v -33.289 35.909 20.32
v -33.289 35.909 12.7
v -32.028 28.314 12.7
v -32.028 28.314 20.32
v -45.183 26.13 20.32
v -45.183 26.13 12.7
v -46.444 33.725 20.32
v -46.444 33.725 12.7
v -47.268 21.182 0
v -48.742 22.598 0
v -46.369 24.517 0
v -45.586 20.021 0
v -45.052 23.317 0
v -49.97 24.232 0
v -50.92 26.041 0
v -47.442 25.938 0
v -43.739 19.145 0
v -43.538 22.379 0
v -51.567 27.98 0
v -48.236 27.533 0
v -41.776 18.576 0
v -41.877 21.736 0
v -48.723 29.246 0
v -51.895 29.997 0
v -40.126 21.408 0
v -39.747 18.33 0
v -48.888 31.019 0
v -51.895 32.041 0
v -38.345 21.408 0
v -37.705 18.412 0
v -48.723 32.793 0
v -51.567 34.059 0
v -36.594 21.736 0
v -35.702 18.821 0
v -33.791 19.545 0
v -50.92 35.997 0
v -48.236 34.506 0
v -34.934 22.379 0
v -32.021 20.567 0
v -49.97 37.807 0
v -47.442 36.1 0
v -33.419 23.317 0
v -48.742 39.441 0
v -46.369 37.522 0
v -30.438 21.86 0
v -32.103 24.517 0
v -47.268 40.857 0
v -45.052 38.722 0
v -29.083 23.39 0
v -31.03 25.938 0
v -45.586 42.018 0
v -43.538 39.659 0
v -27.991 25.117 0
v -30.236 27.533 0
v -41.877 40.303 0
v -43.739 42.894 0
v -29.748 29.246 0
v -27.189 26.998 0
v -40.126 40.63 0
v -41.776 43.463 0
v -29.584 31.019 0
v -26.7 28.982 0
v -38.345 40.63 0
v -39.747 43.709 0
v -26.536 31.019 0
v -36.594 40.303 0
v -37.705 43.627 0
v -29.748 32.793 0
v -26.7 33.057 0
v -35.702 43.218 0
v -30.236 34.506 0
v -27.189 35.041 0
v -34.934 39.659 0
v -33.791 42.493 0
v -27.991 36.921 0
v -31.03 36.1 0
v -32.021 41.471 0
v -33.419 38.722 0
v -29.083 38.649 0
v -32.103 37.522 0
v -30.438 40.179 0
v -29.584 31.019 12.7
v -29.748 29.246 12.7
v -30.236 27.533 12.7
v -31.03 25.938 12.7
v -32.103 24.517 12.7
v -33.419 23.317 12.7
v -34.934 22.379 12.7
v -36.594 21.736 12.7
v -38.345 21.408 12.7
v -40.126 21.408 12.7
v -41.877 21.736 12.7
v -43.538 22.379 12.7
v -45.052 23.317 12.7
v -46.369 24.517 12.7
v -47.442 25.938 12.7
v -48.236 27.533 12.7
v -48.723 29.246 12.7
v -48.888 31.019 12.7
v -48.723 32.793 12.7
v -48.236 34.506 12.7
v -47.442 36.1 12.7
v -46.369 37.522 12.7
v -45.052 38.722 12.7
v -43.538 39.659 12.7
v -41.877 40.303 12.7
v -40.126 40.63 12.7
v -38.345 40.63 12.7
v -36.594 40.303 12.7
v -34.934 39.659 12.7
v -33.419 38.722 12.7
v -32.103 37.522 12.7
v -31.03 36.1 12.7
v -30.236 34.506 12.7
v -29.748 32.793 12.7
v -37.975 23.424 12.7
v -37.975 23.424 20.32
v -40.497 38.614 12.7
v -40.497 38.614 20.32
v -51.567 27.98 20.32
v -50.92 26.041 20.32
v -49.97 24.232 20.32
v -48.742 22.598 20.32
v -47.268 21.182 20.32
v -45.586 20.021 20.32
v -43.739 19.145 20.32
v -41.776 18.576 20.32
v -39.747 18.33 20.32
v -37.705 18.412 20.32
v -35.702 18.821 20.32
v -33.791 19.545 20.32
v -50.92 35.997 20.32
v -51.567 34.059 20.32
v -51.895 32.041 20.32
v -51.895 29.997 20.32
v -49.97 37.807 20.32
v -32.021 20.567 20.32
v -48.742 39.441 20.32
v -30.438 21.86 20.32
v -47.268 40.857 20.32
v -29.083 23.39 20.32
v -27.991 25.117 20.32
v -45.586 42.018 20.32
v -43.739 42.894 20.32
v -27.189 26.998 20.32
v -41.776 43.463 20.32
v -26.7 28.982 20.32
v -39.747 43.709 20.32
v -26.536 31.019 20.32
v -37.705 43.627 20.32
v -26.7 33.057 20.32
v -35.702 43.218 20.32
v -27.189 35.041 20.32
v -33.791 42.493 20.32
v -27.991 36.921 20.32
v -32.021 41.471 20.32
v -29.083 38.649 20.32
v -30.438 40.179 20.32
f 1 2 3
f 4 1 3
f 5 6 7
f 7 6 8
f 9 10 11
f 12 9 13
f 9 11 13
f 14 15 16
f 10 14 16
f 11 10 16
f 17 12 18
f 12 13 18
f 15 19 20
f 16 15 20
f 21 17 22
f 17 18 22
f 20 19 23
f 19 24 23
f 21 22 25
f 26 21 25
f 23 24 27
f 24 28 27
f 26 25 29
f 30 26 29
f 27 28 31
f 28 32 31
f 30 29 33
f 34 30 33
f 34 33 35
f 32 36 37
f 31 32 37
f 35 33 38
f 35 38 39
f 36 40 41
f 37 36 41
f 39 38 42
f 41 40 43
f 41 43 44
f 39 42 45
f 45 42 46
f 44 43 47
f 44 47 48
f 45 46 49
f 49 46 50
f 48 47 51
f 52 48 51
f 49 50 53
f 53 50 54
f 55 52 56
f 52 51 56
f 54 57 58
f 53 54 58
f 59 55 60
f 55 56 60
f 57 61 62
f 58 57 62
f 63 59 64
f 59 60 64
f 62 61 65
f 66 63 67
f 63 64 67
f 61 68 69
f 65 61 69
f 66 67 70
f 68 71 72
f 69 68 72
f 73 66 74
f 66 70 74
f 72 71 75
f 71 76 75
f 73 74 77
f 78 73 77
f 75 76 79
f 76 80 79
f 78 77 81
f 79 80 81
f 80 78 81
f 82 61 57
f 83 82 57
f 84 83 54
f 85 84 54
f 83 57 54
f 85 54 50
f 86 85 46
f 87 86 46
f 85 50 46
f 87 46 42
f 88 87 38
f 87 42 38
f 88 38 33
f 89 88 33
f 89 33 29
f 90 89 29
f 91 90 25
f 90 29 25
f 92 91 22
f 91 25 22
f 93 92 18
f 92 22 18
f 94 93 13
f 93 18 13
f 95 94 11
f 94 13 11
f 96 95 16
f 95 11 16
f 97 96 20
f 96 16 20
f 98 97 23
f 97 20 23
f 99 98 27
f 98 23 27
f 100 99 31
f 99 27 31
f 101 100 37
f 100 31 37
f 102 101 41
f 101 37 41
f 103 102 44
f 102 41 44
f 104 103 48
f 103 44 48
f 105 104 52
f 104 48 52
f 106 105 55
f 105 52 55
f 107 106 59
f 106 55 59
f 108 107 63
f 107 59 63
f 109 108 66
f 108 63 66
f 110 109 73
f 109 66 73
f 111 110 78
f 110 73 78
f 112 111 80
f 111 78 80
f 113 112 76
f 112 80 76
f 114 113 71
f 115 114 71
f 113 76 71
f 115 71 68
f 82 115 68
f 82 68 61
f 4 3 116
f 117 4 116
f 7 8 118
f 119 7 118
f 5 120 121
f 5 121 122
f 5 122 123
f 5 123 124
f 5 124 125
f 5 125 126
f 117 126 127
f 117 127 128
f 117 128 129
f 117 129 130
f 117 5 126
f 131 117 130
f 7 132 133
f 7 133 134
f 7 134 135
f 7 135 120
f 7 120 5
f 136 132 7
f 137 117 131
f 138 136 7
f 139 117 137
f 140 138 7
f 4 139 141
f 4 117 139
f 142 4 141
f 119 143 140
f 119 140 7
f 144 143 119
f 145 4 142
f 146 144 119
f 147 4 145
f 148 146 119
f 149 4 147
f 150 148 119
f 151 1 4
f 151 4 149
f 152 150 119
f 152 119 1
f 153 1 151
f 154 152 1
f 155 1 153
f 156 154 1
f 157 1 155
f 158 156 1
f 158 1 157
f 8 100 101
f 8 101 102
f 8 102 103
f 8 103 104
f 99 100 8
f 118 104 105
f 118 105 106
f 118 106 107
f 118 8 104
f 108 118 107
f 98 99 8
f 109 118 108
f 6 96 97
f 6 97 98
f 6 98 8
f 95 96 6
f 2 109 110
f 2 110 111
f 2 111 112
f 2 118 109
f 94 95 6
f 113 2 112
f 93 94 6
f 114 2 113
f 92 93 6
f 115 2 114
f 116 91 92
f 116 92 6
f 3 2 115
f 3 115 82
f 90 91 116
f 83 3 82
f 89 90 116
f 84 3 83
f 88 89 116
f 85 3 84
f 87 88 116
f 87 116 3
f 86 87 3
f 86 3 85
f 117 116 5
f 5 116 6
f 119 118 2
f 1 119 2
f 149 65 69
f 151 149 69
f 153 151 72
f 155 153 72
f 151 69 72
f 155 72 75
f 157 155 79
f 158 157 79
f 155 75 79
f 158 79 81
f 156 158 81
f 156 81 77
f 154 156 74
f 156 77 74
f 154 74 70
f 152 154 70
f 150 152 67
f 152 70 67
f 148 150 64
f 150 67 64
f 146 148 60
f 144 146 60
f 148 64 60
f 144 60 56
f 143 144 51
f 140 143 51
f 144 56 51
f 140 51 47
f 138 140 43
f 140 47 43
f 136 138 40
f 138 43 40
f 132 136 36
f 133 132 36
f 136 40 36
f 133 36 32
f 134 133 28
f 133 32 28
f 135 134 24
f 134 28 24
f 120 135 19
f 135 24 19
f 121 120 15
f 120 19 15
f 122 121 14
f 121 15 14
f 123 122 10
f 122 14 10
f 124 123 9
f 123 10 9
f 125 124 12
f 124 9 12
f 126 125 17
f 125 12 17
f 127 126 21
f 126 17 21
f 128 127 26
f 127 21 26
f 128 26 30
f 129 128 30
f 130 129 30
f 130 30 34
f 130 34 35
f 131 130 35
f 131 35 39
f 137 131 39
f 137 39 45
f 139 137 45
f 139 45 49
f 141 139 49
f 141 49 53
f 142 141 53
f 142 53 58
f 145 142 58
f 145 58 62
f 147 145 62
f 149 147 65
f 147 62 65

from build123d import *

# Parameters (mm, degrees)
F0_R     = 12.7
F0_R_2   = 10.16
F1_DEPTH = 20.32
F2_DEPTH = 20.32
F3_R     = 9.652
F4_DEPTH = 12.7


with BuildPart() as f1:
    # F0 (on Top) → F1 (new body)
    with BuildSketch(Plane.XY):
        with Locations((-39.235822, 31.019291)):
            Circle(F0_R)
        with Locations((-39.235822, 31.019291)):
            Circle(F0_R_2, mode=Mode.SUBTRACT)
    extrude(amount=F1_DEPTH)

    # F0 (on Top) → F2 (join)
    with BuildSketch(Plane.XY):
        with Locations((-39.235822, 31.019291)):
            Circle(F0_R_2)
        Polygon((-40.496945, 38.614266), (-33.288942, 35.908943), (-32.027819, 28.313968), (-37.974699, 23.424316), (-45.182701, 26.129639), (-46.443824, 33.724614), align=None, mode=Mode.SUBTRACT)
    extrude(amount=F2_DEPTH)

    # F3 (on face) → F4 (cut)
    with BuildSketch(Plane(origin=(0, 0, 0), x_dir=(1, 0, 0), z_dir=(0, 0, -1))):
        with Locations((-39.235822, -31.019291)):
            Circle(F3_R)
    extrude(amount=-F4_DEPTH, mode=Mode.SUBTRACT)


solid = f1.part
